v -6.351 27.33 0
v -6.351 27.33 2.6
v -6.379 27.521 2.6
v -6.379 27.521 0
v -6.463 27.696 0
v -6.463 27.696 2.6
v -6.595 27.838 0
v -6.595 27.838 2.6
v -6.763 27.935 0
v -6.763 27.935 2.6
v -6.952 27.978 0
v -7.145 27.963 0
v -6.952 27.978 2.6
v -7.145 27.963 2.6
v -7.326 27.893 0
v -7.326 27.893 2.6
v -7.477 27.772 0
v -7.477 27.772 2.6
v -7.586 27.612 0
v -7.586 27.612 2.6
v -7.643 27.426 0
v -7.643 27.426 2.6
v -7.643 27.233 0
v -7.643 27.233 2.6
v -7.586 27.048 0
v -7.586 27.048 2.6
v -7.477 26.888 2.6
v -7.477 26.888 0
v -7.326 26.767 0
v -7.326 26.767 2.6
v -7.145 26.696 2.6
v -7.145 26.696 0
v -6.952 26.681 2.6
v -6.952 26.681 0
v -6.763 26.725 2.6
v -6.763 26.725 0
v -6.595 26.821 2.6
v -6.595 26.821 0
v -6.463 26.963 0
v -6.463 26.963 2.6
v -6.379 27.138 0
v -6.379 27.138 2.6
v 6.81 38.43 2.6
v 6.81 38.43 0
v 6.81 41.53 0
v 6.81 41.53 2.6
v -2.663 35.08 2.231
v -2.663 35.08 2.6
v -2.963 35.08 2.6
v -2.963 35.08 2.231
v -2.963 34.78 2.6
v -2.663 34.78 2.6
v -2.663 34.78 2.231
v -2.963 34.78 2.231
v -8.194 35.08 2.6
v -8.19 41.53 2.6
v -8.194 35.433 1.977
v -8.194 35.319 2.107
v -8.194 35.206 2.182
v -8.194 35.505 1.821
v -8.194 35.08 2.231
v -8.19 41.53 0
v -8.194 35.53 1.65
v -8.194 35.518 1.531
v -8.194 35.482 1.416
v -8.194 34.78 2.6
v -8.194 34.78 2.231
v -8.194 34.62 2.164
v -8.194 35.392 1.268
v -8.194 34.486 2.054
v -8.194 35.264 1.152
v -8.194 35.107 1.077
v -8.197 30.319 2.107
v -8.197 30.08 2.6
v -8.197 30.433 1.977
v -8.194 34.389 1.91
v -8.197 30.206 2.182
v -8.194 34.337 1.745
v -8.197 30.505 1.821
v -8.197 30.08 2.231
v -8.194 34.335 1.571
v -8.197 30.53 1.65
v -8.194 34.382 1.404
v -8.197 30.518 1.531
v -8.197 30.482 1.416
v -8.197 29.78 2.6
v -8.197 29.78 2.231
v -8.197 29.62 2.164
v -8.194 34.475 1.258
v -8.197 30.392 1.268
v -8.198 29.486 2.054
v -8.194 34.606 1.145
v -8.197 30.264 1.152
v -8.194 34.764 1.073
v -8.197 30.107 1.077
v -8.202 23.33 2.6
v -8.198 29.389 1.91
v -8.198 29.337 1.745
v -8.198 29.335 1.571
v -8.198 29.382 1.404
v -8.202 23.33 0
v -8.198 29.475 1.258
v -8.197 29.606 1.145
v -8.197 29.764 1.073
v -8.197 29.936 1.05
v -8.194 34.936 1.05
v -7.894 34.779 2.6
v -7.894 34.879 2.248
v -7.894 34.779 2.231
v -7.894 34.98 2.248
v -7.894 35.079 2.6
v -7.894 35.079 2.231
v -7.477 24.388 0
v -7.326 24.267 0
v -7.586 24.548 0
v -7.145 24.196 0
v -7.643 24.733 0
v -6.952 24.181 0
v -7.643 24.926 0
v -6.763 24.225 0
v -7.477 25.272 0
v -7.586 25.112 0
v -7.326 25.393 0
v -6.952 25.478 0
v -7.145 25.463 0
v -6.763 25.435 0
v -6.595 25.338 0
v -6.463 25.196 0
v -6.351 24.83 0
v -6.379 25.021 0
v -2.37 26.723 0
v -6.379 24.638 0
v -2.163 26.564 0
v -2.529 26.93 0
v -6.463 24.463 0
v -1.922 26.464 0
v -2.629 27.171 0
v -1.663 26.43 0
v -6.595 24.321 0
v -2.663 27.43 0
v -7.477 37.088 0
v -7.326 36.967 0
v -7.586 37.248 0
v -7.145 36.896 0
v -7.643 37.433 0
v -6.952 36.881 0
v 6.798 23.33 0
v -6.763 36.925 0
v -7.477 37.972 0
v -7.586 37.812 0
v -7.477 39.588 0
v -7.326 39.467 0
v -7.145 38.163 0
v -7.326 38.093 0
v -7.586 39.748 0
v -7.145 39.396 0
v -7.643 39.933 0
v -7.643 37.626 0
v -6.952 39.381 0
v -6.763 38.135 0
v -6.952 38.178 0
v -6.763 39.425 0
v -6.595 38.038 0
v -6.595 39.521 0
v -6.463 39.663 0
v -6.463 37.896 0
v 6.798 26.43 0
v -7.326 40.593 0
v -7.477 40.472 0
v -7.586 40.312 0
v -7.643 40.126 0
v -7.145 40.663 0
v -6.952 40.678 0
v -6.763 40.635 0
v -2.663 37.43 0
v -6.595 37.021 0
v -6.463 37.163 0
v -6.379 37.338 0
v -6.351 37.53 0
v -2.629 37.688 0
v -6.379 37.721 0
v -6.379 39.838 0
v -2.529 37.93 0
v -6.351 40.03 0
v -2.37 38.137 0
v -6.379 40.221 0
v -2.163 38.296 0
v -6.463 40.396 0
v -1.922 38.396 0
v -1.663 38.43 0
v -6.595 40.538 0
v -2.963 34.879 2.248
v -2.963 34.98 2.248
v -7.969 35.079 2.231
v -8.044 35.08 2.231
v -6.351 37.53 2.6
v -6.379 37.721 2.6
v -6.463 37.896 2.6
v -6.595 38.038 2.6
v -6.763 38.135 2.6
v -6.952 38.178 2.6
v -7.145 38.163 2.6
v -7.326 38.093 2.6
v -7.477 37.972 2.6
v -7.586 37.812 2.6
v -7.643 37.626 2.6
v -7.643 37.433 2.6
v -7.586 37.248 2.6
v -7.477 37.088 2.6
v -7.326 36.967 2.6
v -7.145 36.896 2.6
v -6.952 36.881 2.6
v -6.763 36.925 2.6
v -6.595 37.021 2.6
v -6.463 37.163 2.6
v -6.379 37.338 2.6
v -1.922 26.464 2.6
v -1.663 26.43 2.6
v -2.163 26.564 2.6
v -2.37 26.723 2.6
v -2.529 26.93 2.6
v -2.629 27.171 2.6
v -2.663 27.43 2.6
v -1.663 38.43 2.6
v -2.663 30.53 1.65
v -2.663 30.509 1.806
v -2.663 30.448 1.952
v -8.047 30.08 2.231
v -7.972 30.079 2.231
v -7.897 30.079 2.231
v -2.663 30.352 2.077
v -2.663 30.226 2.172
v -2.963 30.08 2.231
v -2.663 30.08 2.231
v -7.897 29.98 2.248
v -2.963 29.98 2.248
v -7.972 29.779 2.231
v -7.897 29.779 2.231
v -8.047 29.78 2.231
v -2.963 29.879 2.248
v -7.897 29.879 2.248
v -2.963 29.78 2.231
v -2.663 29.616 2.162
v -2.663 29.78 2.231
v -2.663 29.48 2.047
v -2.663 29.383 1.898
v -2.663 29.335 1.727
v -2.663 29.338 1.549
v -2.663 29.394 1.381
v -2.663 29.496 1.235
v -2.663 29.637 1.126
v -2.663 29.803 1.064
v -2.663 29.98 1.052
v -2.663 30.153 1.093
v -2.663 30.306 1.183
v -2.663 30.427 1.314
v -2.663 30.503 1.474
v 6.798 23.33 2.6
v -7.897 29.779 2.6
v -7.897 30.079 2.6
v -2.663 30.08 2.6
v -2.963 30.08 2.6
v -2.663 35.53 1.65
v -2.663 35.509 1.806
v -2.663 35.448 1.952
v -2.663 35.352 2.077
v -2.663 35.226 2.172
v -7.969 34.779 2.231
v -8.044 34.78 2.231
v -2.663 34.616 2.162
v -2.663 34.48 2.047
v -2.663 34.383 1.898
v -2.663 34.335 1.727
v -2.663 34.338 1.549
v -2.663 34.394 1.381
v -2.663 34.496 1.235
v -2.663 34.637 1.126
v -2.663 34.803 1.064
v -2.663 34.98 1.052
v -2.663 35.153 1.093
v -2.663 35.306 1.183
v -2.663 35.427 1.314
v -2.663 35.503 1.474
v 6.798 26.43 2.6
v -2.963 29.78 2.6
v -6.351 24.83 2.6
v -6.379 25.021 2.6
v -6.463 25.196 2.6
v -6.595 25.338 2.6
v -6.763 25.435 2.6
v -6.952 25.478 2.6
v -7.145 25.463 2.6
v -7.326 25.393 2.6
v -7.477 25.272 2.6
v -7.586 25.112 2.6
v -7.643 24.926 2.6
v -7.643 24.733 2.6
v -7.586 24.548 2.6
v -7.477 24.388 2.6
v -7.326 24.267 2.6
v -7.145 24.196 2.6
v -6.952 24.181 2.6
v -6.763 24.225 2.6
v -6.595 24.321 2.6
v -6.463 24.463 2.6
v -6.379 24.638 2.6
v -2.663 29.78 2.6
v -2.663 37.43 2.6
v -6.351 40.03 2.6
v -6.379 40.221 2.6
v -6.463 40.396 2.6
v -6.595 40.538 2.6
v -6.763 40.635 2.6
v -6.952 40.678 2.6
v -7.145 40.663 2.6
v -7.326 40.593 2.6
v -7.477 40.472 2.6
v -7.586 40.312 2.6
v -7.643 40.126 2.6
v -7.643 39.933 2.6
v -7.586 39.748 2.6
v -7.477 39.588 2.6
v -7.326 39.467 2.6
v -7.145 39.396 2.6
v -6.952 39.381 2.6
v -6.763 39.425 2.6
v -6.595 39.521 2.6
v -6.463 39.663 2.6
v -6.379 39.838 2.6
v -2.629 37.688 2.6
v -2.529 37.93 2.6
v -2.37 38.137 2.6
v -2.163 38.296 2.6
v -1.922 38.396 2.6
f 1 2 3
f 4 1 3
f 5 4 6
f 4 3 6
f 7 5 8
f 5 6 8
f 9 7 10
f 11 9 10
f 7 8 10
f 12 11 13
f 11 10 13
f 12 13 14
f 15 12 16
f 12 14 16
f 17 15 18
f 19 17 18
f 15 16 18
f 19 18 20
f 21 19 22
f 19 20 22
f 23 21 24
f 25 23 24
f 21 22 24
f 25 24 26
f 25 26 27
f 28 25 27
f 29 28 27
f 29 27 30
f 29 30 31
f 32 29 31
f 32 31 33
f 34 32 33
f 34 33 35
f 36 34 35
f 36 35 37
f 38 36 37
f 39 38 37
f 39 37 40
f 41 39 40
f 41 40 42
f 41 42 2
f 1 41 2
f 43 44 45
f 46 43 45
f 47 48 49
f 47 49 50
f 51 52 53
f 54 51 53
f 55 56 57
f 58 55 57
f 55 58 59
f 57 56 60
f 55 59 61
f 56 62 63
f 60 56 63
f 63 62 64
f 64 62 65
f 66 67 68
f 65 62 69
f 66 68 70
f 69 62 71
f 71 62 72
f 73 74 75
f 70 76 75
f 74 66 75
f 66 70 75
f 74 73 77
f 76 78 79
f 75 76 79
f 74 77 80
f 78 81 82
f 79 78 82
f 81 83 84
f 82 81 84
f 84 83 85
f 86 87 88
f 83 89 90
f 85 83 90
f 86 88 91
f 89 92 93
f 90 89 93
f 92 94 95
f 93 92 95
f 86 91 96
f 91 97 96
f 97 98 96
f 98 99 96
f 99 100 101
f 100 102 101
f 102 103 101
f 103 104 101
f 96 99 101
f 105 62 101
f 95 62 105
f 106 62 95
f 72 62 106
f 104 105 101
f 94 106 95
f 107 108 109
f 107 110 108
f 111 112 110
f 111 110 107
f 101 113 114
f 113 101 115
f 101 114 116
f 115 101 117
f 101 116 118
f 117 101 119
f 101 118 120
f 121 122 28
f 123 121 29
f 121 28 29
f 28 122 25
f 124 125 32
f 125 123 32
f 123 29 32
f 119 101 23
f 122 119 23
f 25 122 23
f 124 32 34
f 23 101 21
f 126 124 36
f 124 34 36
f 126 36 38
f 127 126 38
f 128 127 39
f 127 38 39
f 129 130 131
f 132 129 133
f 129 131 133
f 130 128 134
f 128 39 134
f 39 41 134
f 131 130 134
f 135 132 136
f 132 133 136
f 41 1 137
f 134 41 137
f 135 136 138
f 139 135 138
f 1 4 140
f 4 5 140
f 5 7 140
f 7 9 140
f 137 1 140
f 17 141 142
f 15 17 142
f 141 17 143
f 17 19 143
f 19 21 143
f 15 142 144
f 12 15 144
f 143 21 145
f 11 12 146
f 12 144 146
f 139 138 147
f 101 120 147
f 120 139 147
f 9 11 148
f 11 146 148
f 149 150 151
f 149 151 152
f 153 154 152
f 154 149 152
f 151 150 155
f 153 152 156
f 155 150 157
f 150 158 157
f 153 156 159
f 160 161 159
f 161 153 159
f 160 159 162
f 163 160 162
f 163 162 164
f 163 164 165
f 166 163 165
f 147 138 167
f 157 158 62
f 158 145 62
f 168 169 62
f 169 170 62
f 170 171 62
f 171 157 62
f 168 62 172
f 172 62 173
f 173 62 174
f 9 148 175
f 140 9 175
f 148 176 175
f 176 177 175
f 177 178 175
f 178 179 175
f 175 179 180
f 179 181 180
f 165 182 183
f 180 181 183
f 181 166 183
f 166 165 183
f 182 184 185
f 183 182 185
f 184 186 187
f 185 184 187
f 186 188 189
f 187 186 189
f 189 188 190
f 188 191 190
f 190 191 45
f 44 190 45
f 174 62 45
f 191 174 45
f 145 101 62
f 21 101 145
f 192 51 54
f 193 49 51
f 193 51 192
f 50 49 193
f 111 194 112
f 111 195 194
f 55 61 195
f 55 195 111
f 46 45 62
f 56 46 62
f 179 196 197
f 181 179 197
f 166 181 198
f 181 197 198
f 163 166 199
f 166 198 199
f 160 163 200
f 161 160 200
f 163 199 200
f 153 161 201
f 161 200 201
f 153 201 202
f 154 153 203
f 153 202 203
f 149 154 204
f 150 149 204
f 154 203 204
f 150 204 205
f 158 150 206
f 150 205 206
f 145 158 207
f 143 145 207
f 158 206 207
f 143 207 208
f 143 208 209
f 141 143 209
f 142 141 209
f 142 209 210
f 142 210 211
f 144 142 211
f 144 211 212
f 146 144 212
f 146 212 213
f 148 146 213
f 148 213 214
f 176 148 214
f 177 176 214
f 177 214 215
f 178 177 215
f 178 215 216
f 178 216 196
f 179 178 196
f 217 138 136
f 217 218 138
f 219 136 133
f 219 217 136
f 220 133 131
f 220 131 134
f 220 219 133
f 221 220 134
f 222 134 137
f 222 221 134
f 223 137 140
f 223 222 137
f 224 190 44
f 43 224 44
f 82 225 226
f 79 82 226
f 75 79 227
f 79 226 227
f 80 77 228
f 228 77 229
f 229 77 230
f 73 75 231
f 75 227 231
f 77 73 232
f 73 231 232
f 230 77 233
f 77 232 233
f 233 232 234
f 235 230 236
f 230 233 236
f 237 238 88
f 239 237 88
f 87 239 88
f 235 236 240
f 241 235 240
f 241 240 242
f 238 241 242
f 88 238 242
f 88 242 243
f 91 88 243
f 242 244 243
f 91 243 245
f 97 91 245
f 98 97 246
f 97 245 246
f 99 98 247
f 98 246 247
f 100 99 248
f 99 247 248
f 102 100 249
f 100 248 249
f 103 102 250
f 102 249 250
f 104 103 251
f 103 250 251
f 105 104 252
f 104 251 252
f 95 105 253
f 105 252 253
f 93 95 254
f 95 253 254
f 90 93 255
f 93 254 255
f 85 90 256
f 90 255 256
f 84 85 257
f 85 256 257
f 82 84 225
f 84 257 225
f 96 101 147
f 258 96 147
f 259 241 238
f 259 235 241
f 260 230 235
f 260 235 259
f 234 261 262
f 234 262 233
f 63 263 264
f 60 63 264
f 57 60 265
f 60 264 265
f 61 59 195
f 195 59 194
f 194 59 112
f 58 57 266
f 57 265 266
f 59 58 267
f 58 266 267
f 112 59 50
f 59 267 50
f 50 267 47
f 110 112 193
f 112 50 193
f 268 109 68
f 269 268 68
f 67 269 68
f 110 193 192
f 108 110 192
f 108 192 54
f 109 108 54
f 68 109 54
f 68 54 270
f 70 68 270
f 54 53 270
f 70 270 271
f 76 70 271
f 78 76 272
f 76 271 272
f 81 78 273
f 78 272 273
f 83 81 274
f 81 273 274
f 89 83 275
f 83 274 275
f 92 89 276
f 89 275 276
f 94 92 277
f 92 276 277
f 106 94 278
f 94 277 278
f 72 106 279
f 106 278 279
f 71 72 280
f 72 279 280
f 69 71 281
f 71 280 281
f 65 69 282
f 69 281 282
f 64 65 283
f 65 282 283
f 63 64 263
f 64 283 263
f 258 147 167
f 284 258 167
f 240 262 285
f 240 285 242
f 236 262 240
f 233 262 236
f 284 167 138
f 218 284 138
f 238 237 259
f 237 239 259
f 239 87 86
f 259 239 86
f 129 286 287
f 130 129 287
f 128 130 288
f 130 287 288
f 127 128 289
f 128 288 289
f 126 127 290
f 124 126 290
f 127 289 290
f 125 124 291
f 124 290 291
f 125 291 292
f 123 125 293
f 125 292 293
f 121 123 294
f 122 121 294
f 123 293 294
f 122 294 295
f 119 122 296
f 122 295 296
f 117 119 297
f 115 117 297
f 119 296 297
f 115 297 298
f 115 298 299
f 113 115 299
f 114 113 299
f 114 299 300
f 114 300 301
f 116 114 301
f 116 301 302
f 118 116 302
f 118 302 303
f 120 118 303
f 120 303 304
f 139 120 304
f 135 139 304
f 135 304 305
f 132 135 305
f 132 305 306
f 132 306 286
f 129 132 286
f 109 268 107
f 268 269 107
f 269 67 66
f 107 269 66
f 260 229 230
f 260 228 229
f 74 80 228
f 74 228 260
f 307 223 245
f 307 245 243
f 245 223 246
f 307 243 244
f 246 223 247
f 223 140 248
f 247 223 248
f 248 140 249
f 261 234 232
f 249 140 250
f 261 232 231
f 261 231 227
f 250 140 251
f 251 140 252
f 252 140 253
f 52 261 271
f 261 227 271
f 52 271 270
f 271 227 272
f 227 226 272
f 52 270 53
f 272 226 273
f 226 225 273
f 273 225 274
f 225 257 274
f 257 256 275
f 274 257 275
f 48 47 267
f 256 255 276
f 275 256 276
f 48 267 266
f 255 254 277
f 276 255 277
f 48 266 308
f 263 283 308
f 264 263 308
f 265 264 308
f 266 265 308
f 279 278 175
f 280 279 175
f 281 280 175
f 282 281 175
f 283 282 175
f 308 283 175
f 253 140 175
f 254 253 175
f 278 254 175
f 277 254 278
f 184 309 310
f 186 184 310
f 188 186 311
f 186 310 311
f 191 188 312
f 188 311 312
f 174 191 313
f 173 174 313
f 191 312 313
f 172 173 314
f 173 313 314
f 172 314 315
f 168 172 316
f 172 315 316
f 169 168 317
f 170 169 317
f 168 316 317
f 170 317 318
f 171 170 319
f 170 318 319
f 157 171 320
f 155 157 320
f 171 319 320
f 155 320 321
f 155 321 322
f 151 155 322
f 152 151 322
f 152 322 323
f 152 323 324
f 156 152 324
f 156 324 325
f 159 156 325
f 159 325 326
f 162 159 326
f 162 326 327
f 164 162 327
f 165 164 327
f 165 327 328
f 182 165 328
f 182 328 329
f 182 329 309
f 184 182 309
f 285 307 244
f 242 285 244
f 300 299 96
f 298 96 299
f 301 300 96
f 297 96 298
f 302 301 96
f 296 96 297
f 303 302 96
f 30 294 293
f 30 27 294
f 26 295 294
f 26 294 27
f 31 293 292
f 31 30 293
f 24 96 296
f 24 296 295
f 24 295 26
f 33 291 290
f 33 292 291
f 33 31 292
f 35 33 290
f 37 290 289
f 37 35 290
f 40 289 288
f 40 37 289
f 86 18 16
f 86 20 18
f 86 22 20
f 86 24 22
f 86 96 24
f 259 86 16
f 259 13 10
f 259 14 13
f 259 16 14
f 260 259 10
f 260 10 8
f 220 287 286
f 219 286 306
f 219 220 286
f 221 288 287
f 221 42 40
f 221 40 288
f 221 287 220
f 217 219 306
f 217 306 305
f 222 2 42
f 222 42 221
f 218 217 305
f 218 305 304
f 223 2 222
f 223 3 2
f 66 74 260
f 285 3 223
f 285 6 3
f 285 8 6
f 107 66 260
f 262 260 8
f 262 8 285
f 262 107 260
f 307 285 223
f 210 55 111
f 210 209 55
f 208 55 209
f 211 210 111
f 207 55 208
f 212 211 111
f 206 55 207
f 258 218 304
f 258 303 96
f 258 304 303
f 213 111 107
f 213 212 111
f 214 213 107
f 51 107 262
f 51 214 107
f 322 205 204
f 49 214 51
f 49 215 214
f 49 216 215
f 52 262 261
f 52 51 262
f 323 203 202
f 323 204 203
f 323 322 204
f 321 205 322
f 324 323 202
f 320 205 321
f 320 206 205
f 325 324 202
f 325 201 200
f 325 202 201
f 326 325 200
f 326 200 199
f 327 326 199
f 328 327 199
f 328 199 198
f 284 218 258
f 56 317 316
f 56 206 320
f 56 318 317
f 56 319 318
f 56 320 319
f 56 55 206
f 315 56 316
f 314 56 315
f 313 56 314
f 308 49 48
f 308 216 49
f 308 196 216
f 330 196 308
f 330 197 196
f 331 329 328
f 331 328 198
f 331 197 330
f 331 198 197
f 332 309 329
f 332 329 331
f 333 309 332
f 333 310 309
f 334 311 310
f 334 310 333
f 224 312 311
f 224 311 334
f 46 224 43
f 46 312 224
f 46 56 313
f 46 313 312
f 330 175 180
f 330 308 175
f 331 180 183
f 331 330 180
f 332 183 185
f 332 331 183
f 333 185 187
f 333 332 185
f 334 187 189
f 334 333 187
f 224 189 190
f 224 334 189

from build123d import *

# Parameters (mm, degrees)
EXTRUDE_1_DEPTH     = 2.6
SKETCH_2_R          = 0.65
CUT_EXTRUDE_1_DEPTH = 43.411489878
SKETCH_3_R          = 0.6
CUT_EXTRUDE_2_DEPTH = 43.675729829
SKETCH_5_W          = 0.4
SKETCH_5_H          = 0.3
CUT_EXTRUDE_3_DEPTH = 0.3
SKETCH_7_W          = 0.4
SKETCH_7_H          = 0.3
CUT_EXTRUDE_4_DEPTH = 0.3
FILLET_1_R          = 1


with BuildPart() as part:
    # 草圖1 → 填料-伸長1 (new body)
    with BuildSketch(Plane.XY):
        Polygon((6.798471119, 23.329620726), (6.798471119, 26.429618372), (-2.663246867, 26.429618372), (-2.663246867, 38.429618372), (6.810322616, 38.429618372), (6.810322616, 41.529620726), (-8.189677384, 41.529620726), (-8.201528881, 23.329620726), align=None)
    extrude(amount=EXTRUDE_1_DEPTH)

    # 草圖2 → 除料-伸長1 (cut, through all)
    with BuildSketch(Plane.XY.offset(2.6)):
        with Locations((-7.000552109, 24.829620726)):
            Circle(SKETCH_2_R)
        with Locations((-7.000552109, 27.329620726)):
            Circle(SKETCH_2_R)
        with Locations((-7.000552109, 40.029620726)):
            Circle(SKETCH_2_R)
        with Locations((-7.000552109, 37.529620726)):
            Circle(SKETCH_2_R)
    extrude(amount=-CUT_EXTRUDE_1_DEPTH, mode=Mode.SUBTRACT)

    # 草圖3 → 除料-伸長2 (cut, through all)
    with BuildSketch(Plane(origin=(-2.663246867, 0, 0), x_dir=(0, 0, -1), z_dir=(1, 0, 0))):
        with Locations(Location((-1.65, 34.929620726, 0), (0, 0, 90))):
            Circle(SKETCH_3_R)
        with Locations(Location((-1.65, 29.929620726, 0), (0, 0, 90))):
            Circle(SKETCH_3_R)
    extrude(amount=-CUT_EXTRUDE_2_DEPTH, mode=Mode.SUBTRACT)

    # 草圖5 → 除料-伸長3 (cut)
    with BuildSketch(Plane(origin=(-8.216717207, 0.005350572, 0), x_dir=(0, 0, 1), z_dir=(-0.9999997879816068, 0.0006511810359147792, 0))):
        with Locations((2.4, 34.924278959)):
            Rectangle(SKETCH_5_W, SKETCH_5_H)
        with Locations((2.4, 29.924278959)):
            Rectangle(SKETCH_5_W, SKETCH_5_H)
    extrude(amount=-CUT_EXTRUDE_3_DEPTH, mode=Mode.SUBTRACT)

    # 草圖7 → 除料-伸長4 (cut)
    with BuildSketch(Plane(origin=(-2.663246867, 0, 0), x_dir=(0, 0, -1), z_dir=(1, 0, 0))):
        with Locations((-2.4, 29.929620726)):
            Rectangle(SKETCH_7_W, SKETCH_7_H)
        with Locations((-2.4, 34.929620726)):
            Rectangle(SKETCH_7_W, SKETCH_7_H)
    extrude(amount=-CUT_EXTRUDE_4_DEPTH, mode=Mode.SUBTRACT)

    # 圓角1
    fillet_1_edges = [part.edges().sort_by_distance(p)[0] for p in [
        (-2.663246867, 38.429618372, 1.3),
        (-2.663246867, 26.429618372, 1.3),
    ]]
    fillet(fillet_1_edges, radius=FILLET_1_R)


solid = part.part
